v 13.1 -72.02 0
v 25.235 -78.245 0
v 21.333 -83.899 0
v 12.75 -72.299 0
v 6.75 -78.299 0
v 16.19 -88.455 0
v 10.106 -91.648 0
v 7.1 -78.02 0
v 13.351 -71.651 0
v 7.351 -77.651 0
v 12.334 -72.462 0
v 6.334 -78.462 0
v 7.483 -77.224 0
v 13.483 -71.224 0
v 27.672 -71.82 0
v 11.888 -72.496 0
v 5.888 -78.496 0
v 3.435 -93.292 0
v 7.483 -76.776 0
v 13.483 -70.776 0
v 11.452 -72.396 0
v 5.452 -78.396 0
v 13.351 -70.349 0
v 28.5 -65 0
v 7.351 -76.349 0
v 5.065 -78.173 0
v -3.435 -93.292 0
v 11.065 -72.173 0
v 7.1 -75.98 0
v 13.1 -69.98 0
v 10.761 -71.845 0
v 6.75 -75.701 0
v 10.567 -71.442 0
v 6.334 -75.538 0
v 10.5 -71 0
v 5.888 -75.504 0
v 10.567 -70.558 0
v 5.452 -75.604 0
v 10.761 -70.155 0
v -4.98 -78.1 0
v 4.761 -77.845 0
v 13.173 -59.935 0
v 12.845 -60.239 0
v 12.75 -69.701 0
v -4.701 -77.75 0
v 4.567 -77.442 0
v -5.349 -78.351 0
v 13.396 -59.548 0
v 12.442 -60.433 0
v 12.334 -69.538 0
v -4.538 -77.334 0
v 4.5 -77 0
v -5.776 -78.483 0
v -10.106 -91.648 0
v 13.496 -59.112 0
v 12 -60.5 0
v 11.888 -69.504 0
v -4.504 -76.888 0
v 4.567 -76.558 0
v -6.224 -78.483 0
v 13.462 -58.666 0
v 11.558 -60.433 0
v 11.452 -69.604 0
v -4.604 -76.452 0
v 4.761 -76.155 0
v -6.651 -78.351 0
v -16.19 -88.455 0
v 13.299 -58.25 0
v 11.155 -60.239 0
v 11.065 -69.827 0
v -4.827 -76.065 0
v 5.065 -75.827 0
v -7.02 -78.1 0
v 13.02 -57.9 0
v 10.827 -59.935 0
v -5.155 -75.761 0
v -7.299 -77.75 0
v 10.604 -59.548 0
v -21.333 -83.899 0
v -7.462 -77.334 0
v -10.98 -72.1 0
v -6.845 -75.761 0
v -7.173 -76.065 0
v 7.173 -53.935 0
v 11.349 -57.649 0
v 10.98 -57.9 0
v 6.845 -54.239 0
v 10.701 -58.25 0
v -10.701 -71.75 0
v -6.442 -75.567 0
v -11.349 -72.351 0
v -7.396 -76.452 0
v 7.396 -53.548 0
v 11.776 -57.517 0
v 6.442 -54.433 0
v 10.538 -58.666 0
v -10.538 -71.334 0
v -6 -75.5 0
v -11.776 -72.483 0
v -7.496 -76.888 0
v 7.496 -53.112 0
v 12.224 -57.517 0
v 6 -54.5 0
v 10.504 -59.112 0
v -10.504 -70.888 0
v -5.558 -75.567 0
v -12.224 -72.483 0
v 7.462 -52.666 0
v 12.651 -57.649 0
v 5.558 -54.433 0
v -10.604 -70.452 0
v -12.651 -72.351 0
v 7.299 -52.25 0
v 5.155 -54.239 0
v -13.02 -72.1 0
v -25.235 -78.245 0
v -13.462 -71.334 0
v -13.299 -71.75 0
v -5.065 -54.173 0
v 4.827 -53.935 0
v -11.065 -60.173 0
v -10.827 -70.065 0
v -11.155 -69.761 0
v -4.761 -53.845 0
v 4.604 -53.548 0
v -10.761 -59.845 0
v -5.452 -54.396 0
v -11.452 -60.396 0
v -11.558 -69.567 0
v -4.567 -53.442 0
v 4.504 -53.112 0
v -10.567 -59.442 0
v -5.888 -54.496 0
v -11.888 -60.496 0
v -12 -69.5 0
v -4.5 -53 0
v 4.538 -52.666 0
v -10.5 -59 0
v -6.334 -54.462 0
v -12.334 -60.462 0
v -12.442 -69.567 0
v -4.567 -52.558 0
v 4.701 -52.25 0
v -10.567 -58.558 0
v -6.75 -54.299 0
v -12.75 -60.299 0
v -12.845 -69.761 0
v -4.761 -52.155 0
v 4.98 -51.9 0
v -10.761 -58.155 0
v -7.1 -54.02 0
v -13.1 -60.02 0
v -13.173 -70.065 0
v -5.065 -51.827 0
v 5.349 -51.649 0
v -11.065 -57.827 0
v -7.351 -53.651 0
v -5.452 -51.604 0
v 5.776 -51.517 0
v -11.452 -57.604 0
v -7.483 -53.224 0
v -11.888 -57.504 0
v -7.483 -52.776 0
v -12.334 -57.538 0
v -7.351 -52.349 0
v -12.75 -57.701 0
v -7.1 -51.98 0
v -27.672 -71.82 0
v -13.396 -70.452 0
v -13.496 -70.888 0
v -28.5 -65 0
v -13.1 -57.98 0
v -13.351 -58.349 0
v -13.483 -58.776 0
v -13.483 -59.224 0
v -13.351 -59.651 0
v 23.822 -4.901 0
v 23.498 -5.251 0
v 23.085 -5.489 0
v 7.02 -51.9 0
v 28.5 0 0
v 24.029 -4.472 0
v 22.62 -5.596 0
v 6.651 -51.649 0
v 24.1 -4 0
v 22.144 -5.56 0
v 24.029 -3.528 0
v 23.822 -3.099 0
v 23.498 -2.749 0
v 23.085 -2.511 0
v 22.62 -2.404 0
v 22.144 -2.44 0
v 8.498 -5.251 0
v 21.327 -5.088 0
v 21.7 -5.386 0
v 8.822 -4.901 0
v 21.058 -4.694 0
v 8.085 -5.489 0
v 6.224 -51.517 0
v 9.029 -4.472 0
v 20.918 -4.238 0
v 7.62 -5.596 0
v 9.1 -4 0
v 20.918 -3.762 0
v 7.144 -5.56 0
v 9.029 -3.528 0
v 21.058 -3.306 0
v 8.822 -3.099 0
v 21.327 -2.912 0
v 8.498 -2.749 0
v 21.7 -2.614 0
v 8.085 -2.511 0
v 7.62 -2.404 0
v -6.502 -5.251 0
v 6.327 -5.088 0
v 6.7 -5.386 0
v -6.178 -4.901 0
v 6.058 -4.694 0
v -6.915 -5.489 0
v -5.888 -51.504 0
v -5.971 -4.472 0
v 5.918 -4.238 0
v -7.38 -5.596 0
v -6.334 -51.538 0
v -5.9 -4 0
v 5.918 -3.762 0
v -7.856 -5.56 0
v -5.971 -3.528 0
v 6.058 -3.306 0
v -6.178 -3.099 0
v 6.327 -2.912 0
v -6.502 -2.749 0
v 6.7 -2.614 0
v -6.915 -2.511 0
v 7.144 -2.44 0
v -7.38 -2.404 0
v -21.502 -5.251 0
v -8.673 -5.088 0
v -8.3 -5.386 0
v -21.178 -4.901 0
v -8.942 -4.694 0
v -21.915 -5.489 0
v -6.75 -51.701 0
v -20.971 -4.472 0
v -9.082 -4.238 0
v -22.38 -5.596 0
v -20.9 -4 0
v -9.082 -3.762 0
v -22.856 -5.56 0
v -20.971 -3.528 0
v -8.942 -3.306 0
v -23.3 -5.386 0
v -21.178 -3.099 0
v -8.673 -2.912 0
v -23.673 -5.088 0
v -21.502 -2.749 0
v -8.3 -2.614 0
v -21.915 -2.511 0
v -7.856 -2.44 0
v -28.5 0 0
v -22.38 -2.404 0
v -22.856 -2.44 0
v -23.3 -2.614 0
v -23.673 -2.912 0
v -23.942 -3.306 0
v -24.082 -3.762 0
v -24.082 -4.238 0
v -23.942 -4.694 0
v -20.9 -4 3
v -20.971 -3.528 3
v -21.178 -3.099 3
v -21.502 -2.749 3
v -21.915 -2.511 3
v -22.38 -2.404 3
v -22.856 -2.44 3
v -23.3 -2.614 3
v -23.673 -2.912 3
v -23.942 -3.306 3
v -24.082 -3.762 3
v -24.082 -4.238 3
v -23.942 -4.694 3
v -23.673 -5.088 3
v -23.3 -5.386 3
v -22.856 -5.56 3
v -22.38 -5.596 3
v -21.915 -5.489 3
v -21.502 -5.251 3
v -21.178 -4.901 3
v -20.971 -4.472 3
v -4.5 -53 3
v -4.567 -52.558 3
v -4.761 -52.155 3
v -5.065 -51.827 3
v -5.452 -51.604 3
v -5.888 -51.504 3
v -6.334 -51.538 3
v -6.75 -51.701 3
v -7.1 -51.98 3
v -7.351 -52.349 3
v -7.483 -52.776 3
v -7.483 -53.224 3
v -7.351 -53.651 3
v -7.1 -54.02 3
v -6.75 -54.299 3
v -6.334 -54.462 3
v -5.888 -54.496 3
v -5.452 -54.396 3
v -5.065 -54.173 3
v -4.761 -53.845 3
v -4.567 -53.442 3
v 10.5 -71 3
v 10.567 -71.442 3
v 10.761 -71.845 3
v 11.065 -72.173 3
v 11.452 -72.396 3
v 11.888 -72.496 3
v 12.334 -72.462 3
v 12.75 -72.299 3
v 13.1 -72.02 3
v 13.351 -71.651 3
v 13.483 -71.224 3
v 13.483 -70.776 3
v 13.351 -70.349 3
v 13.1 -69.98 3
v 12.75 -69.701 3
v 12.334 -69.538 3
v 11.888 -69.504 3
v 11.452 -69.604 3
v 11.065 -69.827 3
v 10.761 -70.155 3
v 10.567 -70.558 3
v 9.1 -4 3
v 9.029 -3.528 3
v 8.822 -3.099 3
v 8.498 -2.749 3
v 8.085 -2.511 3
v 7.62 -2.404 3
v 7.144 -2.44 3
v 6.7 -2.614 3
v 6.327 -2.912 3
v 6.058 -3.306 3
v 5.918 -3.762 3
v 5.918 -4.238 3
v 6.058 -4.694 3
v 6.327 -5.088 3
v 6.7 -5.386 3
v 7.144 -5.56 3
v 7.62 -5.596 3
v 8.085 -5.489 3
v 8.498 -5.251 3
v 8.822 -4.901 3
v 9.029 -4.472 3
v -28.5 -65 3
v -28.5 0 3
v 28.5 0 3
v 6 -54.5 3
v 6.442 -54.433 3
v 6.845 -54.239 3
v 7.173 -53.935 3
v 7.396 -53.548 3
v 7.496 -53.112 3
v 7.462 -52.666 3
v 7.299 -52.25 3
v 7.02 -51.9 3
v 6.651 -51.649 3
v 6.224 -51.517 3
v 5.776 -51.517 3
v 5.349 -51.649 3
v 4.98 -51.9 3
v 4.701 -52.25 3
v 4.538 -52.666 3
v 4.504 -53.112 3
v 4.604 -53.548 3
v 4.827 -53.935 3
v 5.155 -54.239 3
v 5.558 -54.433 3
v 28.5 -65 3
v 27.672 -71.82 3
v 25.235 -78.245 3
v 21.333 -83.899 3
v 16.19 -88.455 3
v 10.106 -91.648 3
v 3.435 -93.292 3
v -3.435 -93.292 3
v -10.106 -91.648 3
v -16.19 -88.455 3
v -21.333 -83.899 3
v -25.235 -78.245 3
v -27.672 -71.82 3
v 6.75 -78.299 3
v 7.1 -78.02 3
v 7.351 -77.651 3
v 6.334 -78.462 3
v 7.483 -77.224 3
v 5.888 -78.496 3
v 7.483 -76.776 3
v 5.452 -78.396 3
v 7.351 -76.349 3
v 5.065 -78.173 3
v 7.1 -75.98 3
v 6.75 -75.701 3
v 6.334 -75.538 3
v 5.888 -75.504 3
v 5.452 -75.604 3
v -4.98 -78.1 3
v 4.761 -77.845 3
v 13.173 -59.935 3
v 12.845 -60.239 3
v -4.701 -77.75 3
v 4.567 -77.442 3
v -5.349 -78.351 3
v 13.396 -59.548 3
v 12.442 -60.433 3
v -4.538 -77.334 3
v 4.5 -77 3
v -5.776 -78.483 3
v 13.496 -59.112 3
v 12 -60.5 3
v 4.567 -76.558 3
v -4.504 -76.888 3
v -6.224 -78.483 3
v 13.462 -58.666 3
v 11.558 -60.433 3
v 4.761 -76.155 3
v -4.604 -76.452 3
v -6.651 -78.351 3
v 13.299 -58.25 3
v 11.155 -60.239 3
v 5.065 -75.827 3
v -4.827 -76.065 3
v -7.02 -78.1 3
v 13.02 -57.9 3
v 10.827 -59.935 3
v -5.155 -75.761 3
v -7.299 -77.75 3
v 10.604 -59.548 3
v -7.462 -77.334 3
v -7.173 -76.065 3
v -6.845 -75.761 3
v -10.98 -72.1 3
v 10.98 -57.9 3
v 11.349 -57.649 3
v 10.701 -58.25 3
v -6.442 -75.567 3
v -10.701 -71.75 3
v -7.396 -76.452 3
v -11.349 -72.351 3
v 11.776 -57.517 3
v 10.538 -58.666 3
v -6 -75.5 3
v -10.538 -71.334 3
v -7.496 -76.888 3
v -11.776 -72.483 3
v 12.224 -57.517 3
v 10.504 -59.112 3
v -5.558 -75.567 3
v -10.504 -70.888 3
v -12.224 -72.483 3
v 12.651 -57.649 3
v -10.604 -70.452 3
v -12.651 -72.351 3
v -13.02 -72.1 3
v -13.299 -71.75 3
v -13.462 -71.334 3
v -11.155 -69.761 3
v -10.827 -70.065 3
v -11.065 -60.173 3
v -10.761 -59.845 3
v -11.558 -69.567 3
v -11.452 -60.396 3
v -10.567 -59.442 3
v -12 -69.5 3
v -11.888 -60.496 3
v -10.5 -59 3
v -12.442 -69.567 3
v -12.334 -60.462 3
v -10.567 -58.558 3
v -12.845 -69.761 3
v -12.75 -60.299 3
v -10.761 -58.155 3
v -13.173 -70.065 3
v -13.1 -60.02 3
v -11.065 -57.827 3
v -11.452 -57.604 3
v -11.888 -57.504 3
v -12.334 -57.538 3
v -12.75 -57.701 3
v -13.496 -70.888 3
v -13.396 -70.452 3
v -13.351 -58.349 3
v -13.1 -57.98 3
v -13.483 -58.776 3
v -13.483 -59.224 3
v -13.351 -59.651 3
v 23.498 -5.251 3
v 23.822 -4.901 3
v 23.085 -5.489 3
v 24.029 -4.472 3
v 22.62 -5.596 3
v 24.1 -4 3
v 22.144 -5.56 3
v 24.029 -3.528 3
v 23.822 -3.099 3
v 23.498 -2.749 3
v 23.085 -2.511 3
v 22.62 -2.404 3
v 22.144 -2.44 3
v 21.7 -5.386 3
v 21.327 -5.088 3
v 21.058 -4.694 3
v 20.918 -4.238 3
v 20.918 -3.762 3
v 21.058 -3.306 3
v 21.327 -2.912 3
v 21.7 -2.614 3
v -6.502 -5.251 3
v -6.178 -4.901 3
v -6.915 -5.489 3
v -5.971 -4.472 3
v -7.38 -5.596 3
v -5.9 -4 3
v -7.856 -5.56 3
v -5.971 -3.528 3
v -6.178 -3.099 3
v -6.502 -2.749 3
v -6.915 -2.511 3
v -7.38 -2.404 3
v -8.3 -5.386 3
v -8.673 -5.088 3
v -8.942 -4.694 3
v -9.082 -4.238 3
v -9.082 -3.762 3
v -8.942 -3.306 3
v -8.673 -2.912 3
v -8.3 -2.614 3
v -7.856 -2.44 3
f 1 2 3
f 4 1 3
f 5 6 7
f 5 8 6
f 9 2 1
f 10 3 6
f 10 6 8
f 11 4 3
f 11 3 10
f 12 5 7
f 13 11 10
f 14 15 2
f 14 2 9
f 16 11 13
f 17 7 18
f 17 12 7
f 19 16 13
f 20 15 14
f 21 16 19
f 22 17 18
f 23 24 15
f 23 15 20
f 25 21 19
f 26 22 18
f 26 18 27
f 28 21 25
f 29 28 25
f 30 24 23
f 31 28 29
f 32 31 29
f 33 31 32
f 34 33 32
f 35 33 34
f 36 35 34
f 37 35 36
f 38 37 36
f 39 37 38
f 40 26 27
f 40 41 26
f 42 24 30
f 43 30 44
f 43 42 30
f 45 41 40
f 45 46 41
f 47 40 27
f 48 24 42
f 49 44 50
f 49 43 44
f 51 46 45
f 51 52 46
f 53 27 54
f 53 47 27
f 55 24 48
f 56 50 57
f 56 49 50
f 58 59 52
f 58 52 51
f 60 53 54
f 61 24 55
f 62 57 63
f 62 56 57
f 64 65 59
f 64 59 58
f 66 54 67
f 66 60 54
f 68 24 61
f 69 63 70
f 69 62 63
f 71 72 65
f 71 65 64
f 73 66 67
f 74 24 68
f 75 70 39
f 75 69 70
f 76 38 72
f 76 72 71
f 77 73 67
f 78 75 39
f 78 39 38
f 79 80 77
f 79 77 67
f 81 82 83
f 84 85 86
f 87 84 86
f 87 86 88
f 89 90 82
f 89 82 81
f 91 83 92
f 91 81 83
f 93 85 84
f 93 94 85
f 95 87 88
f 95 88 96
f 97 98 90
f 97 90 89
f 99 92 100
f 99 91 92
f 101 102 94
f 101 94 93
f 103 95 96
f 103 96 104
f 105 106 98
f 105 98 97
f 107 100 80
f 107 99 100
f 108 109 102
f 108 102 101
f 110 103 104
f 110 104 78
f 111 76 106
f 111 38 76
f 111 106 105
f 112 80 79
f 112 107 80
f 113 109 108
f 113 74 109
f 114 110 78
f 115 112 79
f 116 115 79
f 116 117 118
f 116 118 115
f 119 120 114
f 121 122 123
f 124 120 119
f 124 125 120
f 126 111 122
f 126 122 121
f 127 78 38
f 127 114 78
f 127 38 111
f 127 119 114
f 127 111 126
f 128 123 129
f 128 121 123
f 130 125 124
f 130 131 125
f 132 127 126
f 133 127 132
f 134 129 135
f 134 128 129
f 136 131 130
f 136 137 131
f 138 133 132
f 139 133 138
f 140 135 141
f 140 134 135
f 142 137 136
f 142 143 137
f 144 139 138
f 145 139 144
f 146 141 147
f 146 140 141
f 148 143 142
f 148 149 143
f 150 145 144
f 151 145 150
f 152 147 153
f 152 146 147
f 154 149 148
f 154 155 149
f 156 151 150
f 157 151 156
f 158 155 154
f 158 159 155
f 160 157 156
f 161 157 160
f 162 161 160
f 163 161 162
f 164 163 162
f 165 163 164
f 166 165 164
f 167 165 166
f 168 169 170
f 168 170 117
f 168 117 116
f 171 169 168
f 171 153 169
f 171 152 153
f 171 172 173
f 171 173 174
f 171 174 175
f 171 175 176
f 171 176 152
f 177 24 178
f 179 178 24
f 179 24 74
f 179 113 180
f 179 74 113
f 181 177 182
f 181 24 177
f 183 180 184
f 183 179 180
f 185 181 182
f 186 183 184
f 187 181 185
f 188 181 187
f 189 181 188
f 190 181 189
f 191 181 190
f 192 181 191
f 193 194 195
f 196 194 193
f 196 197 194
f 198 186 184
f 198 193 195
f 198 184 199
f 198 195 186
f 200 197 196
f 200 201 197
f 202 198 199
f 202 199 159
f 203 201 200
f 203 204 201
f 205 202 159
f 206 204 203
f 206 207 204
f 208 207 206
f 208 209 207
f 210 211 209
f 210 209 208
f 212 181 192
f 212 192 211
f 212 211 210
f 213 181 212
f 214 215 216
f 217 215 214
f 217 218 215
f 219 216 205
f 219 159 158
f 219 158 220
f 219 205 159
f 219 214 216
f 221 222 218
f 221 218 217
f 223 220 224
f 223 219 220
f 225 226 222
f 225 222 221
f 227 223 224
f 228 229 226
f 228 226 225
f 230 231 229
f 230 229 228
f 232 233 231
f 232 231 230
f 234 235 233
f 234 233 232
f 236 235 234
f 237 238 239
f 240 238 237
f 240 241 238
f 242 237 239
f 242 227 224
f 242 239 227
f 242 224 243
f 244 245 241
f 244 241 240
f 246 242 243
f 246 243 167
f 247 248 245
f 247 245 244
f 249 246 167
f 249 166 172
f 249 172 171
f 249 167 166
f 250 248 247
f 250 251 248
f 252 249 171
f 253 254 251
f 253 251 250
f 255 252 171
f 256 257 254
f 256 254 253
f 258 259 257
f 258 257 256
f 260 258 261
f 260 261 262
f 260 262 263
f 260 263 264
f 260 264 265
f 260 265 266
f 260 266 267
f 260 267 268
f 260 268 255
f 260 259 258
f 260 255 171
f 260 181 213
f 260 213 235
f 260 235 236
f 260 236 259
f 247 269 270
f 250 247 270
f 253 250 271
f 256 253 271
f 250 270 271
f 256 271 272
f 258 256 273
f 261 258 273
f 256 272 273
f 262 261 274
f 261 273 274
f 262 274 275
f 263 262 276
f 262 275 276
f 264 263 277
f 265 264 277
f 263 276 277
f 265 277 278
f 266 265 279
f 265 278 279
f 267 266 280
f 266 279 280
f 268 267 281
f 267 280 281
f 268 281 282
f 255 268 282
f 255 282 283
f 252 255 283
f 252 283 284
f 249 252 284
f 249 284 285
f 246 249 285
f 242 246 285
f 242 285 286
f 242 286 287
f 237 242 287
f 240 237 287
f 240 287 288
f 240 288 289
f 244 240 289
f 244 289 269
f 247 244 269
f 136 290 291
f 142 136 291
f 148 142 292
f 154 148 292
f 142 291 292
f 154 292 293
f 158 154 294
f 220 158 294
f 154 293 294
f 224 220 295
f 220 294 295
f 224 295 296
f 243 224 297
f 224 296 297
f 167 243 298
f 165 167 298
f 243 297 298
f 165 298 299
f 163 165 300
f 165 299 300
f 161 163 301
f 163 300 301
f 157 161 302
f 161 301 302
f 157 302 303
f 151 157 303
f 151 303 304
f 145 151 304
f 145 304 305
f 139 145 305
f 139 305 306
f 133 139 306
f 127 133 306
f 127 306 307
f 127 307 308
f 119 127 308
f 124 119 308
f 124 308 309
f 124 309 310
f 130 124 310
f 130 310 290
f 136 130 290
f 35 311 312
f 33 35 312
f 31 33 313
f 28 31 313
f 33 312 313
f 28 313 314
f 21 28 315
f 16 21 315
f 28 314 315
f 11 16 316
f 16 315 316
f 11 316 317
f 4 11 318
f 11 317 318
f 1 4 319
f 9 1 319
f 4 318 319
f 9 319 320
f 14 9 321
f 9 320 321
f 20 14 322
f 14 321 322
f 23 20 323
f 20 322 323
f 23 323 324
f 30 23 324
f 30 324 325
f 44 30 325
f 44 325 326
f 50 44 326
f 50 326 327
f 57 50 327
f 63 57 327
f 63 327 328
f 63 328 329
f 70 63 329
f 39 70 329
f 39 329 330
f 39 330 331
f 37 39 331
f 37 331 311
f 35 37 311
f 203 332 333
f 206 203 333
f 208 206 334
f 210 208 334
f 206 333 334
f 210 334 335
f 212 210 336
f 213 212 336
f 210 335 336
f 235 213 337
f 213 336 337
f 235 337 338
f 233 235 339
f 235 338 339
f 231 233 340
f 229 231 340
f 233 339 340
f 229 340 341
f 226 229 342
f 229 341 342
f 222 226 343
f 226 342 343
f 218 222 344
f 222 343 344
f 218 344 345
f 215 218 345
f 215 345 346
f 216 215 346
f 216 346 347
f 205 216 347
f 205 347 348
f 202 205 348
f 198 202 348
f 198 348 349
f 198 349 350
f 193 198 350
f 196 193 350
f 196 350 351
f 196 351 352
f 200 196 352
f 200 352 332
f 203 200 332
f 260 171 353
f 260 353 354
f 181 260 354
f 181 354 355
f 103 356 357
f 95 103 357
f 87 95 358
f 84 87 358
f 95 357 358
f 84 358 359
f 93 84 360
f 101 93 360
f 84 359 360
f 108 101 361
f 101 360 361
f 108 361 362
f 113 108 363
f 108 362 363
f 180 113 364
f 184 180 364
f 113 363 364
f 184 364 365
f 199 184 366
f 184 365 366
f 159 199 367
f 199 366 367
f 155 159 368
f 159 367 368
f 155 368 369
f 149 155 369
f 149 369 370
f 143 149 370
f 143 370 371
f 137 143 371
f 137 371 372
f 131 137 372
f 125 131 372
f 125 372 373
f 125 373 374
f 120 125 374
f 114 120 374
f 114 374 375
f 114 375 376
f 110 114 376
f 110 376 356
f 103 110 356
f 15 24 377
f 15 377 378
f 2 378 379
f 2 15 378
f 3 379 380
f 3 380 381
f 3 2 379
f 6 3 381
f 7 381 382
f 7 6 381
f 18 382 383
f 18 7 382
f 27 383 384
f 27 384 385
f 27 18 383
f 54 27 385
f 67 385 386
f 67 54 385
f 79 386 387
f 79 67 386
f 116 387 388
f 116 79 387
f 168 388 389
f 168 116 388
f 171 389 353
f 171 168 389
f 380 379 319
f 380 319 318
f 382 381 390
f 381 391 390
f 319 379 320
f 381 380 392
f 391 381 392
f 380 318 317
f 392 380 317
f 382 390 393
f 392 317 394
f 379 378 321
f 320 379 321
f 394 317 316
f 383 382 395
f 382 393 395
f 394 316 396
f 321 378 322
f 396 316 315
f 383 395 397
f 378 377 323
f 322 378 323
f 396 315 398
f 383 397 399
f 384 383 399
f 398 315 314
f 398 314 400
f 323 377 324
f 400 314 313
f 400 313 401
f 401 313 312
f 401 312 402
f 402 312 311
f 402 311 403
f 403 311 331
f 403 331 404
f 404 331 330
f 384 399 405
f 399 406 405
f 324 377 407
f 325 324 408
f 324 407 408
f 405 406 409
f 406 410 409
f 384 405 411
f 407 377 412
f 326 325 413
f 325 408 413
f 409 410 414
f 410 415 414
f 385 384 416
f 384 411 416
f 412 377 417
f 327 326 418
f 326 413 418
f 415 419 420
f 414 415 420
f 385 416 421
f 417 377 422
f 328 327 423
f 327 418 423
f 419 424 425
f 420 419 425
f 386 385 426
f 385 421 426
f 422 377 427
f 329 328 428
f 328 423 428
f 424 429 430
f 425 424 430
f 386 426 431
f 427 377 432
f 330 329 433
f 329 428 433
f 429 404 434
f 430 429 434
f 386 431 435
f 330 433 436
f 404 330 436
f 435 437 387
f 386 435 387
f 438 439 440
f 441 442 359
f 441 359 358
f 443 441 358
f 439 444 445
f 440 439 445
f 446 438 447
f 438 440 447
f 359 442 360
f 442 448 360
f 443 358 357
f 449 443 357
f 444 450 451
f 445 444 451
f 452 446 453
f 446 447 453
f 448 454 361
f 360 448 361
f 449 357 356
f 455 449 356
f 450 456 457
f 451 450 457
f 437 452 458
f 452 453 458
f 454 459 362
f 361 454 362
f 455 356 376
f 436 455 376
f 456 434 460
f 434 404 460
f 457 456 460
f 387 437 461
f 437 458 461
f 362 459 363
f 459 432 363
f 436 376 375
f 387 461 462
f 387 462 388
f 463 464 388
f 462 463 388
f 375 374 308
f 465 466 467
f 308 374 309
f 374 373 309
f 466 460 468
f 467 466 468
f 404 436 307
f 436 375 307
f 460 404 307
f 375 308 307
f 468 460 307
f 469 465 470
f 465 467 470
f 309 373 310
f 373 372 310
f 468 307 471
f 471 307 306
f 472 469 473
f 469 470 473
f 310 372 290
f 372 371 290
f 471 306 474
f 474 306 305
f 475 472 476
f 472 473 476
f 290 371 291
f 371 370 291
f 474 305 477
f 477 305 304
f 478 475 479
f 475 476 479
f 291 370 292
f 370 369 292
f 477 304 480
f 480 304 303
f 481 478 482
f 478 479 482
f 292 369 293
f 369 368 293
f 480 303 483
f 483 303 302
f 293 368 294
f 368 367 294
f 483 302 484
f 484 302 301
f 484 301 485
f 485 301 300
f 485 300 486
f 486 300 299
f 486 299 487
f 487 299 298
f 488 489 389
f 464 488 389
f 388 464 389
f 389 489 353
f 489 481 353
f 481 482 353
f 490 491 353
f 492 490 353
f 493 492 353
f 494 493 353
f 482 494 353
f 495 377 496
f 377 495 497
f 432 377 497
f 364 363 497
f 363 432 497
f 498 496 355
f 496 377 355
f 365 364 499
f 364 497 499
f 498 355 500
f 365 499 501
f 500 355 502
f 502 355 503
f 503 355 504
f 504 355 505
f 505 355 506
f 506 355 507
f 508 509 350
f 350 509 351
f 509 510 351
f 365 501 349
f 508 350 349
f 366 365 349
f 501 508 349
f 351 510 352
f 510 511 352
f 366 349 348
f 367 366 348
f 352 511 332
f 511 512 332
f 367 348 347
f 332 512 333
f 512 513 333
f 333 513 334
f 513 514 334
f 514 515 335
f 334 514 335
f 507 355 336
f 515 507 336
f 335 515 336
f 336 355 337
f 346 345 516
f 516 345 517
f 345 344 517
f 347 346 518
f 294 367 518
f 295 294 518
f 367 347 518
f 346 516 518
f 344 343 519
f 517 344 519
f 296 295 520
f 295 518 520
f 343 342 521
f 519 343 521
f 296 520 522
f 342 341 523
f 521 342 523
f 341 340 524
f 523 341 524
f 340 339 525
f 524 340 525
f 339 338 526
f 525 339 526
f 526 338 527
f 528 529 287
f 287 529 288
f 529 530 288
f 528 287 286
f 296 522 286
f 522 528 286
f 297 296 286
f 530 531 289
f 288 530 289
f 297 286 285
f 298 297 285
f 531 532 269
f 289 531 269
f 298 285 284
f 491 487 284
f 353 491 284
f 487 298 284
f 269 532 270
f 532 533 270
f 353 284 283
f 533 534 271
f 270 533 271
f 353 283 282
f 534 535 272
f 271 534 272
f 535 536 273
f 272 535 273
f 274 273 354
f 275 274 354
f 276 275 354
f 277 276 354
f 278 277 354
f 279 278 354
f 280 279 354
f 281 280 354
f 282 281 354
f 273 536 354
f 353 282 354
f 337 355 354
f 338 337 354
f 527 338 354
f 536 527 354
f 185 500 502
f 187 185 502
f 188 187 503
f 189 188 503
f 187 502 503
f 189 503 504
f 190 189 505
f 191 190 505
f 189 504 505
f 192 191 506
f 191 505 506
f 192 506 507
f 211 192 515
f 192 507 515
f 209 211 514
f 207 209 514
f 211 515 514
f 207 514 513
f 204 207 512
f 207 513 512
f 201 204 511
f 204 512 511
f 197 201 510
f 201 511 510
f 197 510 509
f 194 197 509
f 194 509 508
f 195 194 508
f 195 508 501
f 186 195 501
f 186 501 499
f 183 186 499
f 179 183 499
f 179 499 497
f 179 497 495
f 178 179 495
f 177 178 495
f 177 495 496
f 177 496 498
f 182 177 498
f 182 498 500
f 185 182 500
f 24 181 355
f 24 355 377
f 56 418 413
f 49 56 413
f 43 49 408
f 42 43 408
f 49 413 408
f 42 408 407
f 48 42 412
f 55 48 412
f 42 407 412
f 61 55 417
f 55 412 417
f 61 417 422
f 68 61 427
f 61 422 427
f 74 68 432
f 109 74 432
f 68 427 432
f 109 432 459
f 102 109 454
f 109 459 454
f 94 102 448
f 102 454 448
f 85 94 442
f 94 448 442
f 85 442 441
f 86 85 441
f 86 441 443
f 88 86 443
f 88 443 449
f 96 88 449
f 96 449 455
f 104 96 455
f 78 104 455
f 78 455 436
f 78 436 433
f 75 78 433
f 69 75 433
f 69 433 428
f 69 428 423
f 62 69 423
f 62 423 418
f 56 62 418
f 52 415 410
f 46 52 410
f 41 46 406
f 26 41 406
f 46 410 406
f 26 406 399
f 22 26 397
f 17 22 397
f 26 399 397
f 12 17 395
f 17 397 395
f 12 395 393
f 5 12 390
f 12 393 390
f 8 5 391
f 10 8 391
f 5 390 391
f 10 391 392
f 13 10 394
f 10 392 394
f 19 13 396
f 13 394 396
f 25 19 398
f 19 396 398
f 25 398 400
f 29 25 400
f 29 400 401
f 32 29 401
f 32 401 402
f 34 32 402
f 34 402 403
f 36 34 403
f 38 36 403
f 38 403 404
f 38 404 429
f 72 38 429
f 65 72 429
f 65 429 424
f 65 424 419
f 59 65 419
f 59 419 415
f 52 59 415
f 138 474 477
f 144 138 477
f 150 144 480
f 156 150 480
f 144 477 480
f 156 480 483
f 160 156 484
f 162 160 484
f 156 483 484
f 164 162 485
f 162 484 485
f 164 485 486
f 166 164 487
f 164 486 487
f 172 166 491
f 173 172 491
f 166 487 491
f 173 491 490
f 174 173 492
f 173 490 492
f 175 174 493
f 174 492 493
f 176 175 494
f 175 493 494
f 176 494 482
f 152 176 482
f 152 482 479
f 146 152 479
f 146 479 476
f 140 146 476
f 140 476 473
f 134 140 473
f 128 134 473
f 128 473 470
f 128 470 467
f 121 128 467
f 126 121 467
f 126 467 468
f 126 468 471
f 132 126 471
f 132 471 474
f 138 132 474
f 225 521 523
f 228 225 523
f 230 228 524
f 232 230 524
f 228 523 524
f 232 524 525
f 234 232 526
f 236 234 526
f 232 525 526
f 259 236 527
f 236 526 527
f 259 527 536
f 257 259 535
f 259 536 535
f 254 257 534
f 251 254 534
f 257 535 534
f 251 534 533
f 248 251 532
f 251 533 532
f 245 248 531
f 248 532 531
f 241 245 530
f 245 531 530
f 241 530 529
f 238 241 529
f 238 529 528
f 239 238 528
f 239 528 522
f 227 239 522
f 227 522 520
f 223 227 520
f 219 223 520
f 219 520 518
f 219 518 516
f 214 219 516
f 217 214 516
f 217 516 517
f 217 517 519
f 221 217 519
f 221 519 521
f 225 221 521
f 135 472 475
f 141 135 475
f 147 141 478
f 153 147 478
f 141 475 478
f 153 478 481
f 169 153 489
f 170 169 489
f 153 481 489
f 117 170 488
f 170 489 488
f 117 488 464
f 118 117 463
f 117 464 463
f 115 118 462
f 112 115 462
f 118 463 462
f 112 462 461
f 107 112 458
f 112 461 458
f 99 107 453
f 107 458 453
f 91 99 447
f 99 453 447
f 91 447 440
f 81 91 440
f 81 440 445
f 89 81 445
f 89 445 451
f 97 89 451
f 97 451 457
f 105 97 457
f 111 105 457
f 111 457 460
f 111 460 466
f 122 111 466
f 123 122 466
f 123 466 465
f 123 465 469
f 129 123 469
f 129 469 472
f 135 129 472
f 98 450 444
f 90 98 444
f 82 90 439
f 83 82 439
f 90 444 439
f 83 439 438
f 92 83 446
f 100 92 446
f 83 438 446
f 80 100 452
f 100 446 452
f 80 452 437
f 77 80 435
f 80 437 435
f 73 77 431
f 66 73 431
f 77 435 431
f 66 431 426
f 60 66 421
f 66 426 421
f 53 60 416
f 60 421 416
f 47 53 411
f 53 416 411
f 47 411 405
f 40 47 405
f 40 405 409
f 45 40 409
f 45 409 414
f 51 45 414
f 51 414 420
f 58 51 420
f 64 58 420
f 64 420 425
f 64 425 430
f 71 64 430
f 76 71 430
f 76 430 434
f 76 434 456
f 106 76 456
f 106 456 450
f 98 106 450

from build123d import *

# Parameters (mm, degrees)
EXTRUDE_1_DEPTH          = 3
CUT_EXTRUDE_2_REACH      = 99.793
SKETCH_3_R               = 1.6
PATTERN_LINEAR_1_COUNT   = 4
PATTERN_LINEAR_1_PITCH   = 15
CUT_EXTRUDE_1_REACH      = 99.793
SKETCH_2_R               = 1.5
PATTERN_CIRCULAR_1_COUNT = 4


with BuildPart() as part:
    # 草圖1 → 填料-伸長1 (new body)
    with BuildSketch(Plane.XY):
        with BuildLine():
            Line((-28.5, 0), (28.5, 0))
            Line((28.5, 0), (28.5, -65))
            ThreePointArc((28.5, -65), (0, -93.5), (-28.5, -65))
            Line((-28.5, -65), (-28.5, 0))
        make_face()
    extrude(amount=EXTRUDE_1_DEPTH)

    # 草圖3 → 除料-伸長2 (cut, up to next)
    with BuildSketch(Plane.XY.offset(3), mode=Mode.PRIVATE) as cut_extrude_2_sk1:
        with Locations((-22.5, -4)):
            Circle(SKETCH_3_R)
    cut_extrude_2_tool1 = extrude(cut_extrude_2_sk1.sketch, amount=-CUT_EXTRUDE_2_REACH, mode=Mode.PRIVATE) & part.part
    cut_extrude_2 = cut_extrude_2_tool1.solids().sort_by_distance((-22.5, -4, 3))[0]
    add(cut_extrude_2, mode=Mode.SUBTRACT)

    # 直線複製排列1: 除料-伸長2 ×4
    with Locations(*[(i * PATTERN_LINEAR_1_PITCH, 0, 0) for i in range(1, PATTERN_LINEAR_1_COUNT)]):
        add(cut_extrude_2, mode=Mode.SUBTRACT)

    # 草圖2 → 除料-伸長1 (cut, up to next)
    with BuildSketch(Plane.XY.offset(3), mode=Mode.PRIVATE) as cut_extrude_1_sk1:
        with Locations((-6, -53)):
            Circle(SKETCH_2_R)
    cut_extrude_1_tool1 = extrude(cut_extrude_1_sk1.sketch, amount=-CUT_EXTRUDE_1_REACH, mode=Mode.PRIVATE) & part.part
    # 草圖2 → 除料-伸長1 (cut, up to next)
    with BuildSketch(Plane.XY.offset(3), mode=Mode.PRIVATE) as cut_extrude_1_sk2:
        with Locations((-12, -59)):
            Circle(SKETCH_2_R)
    cut_extrude_1_tool2 = extrude(cut_extrude_1_sk2.sketch, amount=-CUT_EXTRUDE_1_REACH, mode=Mode.PRIVATE) & part.part
    cut_extrude_1_1 = cut_extrude_1_tool1.solids().sort_by_distance((-6, -53, 3))[0]
    add(cut_extrude_1_1, mode=Mode.SUBTRACT)
    cut_extrude_1_2 = cut_extrude_1_tool2.solids().sort_by_distance((-12, -59, 3))[0]
    add(cut_extrude_1_2, mode=Mode.SUBTRACT)
    cut_extrude_1 = cut_extrude_1_1 + cut_extrude_1_2  # 除料-伸長1 as one shape, for the pattern or mirror that repeats it

    # 環狀複製排列1: 除料-伸長1 ×4 about axis
    pattern_circular_1_axis = Axis((0, -65, 0), (0, 0, 1))
    for i in range(1, PATTERN_CIRCULAR_1_COUNT):
        add(cut_extrude_1.rotate(pattern_circular_1_axis, i * 360 / PATTERN_CIRCULAR_1_COUNT), mode=Mode.SUBTRACT)


solid = part.part
